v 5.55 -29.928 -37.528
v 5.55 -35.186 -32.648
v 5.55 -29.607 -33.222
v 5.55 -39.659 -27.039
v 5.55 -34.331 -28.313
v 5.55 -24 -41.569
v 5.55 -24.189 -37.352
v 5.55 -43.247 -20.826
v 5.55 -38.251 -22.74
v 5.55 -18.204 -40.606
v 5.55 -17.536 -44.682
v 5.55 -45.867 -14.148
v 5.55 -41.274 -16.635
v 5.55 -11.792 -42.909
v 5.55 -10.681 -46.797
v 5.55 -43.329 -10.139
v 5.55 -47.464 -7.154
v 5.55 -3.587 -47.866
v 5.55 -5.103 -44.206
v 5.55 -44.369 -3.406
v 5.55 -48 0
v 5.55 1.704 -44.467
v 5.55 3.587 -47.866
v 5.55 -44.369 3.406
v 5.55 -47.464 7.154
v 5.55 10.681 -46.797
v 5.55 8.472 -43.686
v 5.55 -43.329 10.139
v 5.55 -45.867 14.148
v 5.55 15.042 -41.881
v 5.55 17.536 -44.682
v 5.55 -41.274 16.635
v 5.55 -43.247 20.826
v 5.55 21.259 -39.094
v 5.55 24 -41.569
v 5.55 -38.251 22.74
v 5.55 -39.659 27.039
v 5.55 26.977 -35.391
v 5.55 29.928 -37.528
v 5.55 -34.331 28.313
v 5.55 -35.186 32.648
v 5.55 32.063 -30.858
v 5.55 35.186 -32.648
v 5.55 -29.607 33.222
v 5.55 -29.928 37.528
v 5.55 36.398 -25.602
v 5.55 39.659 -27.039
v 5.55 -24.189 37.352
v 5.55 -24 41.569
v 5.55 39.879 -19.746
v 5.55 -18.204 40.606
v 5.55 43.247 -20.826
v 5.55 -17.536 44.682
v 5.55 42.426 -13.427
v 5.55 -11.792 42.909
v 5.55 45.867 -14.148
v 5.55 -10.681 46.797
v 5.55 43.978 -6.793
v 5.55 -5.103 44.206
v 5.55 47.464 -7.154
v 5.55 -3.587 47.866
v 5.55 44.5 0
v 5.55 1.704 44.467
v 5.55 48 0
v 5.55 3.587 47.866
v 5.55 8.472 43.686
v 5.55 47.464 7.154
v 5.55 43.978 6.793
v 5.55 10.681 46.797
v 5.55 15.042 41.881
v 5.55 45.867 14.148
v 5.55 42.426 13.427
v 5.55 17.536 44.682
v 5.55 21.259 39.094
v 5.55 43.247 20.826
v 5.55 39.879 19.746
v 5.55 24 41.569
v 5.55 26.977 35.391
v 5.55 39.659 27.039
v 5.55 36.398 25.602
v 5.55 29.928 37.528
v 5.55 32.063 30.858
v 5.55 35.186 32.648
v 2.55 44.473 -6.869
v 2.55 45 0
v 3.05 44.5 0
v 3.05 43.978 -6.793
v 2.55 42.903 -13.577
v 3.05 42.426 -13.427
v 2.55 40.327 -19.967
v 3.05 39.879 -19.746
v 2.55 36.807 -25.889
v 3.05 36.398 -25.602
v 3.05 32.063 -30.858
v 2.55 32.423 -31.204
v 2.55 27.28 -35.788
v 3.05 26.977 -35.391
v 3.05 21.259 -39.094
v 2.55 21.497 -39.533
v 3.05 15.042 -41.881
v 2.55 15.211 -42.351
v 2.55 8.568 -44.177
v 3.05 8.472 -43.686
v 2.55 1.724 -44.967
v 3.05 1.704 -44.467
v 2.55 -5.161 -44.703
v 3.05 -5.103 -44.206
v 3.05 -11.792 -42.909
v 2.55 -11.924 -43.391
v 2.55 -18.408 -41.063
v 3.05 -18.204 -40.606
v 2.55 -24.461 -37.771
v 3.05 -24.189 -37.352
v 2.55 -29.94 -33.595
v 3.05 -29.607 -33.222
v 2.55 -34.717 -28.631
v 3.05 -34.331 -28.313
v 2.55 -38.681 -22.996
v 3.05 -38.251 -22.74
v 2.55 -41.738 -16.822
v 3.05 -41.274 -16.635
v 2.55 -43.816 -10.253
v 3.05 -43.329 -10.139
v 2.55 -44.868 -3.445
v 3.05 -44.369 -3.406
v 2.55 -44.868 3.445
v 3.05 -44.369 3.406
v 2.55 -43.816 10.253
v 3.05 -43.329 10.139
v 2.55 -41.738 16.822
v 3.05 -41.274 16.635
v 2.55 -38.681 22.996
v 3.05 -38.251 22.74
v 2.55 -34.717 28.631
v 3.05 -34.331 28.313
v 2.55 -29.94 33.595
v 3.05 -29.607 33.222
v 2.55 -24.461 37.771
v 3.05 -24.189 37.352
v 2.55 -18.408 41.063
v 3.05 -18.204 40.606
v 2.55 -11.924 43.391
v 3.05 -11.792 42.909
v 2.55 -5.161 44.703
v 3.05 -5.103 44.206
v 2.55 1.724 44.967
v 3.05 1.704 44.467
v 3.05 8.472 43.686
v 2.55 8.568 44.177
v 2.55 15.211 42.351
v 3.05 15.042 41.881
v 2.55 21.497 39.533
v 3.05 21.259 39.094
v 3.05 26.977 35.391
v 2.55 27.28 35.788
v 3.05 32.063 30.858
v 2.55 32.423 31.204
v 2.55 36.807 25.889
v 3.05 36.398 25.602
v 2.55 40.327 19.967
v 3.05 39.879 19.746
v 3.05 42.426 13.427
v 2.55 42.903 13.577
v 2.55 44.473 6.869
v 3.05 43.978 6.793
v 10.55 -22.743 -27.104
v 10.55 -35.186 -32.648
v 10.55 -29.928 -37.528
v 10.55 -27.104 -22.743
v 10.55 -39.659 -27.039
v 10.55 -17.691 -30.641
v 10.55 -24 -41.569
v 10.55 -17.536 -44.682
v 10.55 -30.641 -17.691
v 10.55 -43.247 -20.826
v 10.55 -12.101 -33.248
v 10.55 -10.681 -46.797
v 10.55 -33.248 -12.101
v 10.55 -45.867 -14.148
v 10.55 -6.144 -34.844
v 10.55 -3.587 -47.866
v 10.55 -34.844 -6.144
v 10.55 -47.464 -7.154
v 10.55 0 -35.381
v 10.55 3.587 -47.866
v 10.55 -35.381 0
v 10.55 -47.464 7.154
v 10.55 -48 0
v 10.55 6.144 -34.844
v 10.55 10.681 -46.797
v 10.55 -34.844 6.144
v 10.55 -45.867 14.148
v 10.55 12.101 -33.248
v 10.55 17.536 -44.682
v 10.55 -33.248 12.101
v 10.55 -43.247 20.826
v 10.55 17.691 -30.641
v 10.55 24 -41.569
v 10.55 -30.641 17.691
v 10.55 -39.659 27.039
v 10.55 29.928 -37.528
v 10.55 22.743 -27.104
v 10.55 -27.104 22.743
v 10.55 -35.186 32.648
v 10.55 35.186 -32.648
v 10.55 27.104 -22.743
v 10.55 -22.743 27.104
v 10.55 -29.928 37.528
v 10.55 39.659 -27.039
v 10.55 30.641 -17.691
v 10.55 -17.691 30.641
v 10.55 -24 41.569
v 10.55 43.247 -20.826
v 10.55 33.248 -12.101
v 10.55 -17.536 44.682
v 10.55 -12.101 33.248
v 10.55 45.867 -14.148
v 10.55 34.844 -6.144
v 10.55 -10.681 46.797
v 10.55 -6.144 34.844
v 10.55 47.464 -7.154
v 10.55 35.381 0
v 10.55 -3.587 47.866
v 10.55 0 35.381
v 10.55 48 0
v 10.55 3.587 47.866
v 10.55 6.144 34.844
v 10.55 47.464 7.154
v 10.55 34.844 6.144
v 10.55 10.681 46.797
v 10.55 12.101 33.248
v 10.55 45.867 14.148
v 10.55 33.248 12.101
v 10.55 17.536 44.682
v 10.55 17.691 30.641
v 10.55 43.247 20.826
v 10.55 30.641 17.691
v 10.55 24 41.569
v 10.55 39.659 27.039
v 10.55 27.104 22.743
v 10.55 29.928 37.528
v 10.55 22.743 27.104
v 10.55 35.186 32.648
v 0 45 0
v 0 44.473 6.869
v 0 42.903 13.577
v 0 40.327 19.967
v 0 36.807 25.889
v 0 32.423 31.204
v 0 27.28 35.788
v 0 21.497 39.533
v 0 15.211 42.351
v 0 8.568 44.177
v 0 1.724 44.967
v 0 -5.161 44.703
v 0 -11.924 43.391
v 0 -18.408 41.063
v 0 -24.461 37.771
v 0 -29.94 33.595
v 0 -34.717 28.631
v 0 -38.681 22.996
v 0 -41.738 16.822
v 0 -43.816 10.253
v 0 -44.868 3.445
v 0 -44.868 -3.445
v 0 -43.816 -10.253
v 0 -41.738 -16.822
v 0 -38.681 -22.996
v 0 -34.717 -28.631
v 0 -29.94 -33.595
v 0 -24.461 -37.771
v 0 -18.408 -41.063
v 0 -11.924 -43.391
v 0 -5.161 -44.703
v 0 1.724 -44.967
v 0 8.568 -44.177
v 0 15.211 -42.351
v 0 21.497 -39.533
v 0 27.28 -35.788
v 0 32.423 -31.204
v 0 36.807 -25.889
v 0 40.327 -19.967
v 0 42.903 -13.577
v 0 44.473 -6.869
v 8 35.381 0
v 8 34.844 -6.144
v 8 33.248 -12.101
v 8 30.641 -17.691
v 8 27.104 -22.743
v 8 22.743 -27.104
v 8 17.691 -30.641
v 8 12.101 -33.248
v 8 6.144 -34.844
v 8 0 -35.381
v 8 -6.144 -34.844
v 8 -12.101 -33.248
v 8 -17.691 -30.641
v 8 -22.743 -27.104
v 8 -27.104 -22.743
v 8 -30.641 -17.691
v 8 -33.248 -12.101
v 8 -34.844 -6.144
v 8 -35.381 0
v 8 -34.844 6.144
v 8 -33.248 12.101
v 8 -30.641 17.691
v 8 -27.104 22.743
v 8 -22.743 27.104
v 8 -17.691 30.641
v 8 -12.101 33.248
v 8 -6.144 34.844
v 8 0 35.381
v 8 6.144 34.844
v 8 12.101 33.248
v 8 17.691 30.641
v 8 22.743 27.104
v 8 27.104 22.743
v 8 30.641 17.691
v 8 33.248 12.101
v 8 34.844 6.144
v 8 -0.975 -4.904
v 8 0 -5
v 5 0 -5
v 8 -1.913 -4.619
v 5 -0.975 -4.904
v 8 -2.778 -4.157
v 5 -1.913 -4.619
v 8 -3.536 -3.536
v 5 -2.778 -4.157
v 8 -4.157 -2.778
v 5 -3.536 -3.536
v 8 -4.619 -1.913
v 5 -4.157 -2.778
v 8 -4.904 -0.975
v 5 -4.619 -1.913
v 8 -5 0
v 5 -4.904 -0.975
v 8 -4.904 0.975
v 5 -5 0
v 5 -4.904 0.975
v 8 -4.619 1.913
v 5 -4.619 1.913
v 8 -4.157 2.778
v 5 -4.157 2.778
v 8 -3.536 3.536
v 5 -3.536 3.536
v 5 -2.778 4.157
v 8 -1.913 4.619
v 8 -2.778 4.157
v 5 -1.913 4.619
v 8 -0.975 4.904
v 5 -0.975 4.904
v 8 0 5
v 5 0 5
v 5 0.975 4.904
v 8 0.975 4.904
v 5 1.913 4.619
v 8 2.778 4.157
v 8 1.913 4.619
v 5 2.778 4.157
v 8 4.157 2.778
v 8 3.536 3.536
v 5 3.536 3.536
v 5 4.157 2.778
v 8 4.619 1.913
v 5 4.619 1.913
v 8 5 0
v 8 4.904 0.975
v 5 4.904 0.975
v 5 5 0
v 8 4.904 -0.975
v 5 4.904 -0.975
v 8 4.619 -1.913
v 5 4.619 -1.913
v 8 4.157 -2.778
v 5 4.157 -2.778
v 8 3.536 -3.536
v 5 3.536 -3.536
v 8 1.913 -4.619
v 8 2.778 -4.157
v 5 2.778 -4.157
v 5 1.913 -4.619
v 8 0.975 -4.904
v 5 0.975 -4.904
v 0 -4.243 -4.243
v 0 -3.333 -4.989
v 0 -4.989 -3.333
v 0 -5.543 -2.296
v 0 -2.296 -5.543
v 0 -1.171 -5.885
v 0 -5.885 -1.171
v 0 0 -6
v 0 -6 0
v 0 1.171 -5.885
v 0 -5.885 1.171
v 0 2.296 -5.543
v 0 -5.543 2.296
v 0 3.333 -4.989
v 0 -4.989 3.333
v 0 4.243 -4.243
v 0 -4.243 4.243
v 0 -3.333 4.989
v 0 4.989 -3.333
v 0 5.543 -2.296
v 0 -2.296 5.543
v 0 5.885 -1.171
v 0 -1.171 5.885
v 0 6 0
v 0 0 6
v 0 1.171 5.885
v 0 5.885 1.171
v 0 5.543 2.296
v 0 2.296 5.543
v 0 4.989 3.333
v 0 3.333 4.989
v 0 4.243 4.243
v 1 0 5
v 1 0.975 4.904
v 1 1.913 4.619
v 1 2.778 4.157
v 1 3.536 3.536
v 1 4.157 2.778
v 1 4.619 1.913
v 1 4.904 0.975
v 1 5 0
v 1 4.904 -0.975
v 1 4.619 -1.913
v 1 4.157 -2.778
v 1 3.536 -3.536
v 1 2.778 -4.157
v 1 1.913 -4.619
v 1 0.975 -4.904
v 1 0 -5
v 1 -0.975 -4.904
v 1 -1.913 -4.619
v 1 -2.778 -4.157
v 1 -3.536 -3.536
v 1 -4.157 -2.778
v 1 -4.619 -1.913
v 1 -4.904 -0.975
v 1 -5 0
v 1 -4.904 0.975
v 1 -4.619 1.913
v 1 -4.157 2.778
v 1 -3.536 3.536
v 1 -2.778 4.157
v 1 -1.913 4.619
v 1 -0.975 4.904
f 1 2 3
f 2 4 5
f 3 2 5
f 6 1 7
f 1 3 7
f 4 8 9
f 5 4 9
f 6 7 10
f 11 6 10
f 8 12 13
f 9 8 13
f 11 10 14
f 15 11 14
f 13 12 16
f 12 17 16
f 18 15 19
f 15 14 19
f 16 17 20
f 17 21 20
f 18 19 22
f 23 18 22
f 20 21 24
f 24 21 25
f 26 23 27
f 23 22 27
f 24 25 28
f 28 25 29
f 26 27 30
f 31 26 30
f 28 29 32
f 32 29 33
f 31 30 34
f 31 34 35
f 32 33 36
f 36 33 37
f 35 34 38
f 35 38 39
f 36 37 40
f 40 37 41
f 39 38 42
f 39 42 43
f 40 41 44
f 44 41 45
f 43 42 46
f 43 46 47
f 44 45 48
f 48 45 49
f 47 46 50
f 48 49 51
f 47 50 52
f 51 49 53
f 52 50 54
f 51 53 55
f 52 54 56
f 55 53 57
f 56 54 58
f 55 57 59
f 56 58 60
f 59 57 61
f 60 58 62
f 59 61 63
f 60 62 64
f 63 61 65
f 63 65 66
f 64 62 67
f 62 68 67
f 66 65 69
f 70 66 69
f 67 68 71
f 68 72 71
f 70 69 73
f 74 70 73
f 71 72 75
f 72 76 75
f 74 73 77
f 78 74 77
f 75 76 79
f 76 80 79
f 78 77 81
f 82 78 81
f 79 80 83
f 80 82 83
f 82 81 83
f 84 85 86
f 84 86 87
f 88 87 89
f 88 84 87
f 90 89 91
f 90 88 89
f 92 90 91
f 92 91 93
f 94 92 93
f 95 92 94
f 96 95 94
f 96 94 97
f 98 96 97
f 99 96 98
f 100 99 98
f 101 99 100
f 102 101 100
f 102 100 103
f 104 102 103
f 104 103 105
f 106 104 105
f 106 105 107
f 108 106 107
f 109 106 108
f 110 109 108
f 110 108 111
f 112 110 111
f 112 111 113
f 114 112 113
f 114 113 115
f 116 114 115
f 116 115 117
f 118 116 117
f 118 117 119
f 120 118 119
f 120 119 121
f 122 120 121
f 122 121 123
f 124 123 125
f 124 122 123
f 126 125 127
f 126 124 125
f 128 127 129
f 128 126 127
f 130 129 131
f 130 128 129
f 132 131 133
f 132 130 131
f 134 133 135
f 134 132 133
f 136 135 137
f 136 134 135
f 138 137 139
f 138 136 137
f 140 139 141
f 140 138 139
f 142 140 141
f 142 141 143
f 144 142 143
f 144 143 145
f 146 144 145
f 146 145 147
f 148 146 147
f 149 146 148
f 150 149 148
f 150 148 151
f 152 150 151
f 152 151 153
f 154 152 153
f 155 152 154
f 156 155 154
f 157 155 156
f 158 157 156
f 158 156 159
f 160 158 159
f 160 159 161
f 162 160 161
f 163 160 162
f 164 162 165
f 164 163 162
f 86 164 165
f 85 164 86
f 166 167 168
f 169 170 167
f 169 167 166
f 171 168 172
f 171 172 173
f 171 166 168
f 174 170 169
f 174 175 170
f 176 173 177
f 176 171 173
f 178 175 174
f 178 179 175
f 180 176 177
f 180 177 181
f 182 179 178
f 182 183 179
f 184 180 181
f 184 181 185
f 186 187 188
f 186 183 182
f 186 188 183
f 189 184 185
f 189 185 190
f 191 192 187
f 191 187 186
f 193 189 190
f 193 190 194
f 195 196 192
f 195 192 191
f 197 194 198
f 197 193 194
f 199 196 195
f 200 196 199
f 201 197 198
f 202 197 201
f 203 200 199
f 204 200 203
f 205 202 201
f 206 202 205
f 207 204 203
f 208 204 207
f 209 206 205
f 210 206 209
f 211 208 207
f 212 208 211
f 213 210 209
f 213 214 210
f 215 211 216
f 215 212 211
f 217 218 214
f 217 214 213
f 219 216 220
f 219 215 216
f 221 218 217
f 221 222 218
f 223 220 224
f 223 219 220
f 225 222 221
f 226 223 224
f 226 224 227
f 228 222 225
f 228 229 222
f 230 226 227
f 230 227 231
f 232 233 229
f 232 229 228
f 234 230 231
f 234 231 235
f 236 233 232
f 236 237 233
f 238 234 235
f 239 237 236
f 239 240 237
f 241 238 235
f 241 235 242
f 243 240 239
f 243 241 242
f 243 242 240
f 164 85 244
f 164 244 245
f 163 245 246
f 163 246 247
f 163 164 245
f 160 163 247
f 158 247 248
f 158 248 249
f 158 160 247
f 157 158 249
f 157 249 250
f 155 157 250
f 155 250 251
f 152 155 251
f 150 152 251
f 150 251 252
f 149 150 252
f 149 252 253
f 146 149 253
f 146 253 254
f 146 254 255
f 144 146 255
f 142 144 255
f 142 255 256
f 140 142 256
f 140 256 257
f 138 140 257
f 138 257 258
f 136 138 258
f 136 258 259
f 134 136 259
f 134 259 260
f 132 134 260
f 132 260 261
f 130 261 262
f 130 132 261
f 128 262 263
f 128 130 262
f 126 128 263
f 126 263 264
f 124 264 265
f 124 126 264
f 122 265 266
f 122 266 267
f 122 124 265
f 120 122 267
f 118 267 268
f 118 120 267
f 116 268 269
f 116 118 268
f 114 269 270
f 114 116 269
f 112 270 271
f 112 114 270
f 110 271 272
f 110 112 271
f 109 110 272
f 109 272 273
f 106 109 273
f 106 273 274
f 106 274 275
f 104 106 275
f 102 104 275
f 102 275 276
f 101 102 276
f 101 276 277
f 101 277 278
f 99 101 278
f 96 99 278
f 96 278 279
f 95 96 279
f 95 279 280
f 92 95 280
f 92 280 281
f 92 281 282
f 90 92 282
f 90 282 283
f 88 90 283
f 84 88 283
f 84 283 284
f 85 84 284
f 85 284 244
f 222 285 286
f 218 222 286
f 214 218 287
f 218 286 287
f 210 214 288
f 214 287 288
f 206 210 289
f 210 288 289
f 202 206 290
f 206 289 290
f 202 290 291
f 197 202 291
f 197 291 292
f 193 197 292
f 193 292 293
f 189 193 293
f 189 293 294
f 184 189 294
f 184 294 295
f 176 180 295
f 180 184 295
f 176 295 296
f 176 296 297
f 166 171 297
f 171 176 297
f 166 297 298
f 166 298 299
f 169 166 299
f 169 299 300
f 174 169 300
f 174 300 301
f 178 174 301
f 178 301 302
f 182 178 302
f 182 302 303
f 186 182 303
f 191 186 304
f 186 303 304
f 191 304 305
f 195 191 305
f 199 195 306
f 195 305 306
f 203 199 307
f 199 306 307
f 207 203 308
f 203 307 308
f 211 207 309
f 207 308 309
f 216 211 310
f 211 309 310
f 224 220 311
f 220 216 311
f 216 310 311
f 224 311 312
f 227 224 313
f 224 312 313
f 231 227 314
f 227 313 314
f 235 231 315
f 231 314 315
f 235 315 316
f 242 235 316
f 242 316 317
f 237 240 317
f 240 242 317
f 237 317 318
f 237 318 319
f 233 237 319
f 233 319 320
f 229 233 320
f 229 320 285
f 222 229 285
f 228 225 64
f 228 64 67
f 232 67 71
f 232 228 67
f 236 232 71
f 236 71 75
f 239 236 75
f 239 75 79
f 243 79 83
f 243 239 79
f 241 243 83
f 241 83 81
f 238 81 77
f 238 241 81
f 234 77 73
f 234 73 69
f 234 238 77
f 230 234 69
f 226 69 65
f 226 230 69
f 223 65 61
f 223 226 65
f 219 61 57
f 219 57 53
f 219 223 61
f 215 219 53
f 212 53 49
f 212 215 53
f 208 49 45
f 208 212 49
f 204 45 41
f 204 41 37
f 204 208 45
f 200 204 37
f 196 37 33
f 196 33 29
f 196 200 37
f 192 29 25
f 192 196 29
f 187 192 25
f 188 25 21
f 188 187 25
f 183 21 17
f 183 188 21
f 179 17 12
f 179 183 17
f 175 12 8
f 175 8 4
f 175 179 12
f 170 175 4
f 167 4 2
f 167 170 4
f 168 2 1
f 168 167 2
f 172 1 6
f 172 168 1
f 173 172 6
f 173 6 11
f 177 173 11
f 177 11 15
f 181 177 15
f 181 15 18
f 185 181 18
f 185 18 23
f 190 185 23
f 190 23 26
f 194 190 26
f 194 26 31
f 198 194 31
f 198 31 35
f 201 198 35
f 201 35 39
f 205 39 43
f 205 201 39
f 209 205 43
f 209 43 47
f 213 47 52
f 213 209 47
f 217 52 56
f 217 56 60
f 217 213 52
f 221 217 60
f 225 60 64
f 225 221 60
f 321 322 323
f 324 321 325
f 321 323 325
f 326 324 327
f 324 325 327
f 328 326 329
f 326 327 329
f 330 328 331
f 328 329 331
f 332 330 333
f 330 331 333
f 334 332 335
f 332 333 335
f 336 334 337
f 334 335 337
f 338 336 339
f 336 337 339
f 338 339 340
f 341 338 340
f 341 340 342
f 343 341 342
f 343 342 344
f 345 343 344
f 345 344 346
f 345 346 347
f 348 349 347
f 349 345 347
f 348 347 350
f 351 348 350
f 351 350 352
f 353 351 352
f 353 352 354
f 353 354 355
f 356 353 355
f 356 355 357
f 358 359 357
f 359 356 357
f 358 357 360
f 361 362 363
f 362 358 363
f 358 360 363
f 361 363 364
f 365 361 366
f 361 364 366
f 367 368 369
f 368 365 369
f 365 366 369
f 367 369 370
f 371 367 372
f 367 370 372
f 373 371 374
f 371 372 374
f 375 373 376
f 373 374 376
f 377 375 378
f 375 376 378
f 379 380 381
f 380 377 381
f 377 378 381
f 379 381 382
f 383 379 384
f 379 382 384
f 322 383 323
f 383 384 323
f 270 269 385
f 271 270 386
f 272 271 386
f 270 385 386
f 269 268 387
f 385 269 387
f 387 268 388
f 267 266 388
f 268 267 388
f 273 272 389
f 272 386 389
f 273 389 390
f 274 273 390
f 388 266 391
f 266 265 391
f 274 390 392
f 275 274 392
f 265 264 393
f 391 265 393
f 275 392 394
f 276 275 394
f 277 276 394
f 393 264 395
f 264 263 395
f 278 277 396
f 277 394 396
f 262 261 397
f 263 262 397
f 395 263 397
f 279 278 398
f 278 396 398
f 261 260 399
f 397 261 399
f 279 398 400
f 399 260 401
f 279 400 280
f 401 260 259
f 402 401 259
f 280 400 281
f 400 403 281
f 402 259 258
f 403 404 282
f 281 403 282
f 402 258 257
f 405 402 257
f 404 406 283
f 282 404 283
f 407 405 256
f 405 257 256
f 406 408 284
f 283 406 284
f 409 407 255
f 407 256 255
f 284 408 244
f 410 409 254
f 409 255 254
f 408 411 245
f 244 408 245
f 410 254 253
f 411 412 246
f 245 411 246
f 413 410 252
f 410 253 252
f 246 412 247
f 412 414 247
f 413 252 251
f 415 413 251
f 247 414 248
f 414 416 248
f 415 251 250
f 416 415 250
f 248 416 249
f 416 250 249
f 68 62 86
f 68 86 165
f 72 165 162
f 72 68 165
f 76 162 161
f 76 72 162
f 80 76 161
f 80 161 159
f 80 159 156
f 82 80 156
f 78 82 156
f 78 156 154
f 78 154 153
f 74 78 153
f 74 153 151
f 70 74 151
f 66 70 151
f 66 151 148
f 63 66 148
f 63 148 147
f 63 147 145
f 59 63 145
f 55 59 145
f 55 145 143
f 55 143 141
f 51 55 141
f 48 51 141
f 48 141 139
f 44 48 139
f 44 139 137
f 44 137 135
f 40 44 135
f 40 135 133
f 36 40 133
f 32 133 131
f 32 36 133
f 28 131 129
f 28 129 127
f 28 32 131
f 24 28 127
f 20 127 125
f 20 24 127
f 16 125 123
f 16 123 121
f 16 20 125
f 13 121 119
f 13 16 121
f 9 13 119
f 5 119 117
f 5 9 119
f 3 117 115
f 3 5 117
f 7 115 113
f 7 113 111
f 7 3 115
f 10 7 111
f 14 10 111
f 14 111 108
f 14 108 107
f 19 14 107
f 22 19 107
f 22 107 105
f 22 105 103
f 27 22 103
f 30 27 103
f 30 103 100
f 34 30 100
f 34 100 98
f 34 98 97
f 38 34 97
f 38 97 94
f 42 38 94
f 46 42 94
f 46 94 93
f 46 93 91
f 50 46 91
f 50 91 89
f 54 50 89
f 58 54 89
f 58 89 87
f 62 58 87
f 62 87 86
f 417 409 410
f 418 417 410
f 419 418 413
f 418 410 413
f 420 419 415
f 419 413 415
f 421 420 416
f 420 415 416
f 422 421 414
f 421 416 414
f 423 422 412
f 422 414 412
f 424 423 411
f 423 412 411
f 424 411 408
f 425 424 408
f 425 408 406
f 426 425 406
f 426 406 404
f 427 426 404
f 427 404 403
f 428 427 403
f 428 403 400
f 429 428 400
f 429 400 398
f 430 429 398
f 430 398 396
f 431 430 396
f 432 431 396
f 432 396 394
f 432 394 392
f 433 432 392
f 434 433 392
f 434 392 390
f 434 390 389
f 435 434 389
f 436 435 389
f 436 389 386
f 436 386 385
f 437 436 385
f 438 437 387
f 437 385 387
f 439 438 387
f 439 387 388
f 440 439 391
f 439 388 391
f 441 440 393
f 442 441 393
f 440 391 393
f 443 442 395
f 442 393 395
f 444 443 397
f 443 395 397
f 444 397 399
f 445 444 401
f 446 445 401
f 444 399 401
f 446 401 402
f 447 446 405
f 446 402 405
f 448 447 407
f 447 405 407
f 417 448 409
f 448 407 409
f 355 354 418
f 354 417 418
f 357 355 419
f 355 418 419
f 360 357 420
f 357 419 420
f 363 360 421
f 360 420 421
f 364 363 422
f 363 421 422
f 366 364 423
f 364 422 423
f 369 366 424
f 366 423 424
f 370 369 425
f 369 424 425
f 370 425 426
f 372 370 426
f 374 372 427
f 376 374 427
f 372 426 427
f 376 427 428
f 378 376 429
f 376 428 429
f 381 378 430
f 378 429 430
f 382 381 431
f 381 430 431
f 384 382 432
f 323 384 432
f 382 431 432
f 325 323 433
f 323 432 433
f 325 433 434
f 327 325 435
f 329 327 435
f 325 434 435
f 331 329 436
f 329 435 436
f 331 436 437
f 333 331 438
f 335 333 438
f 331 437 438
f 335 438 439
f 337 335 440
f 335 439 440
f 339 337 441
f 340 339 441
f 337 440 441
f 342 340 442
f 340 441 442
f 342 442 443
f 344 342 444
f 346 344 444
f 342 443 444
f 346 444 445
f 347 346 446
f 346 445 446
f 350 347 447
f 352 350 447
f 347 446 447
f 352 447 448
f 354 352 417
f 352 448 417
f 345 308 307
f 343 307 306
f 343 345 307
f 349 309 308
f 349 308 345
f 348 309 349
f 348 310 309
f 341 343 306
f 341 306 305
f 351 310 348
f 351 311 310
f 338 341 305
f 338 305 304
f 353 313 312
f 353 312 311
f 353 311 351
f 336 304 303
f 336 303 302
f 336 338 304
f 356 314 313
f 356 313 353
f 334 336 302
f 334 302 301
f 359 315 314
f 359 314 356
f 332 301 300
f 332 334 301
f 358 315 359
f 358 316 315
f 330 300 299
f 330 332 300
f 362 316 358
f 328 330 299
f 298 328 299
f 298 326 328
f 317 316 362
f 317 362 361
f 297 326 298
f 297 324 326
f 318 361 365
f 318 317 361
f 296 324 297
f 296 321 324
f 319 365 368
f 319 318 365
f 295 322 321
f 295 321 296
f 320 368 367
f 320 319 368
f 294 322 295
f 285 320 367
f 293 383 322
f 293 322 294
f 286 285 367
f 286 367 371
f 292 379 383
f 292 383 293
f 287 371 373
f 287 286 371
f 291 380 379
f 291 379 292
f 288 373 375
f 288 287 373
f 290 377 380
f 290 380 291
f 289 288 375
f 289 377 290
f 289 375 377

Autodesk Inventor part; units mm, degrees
ref_plane "YZ Plane" through (0, 0, 0) normal (1, 0, 0) x (0, 1, 0)
ref_plane "XZ Plane" through (0, 0, 0) normal (0, 1, 0) x (-1, 0, 0)
ref_plane "XY Plane" through (0, 0, 0) normal (0, 0, 1) x (1, 0, 0)
sketch "Эскиз1" plane through (0, 0, 0) normal (0, 0, 1) x (1, 0, 0)
  line L0 (0, 0) -> (6.2046, 0)
  line L1 (0, 0) -> (0, 45)
  line L2 (0, 45) -> (2.55, 45)
  line L3 (2.55, 45) -> (3.05, 44.5)
  line L4 (3.05, 44.5) -> (5.55, 44.5)
  line L5 (5.55, 44.5) -> (5.55, 48)
  line L6 (5.55, 48) -> (10.55, 48)
  line L7 (10.55, 48) -> (10.55, 35.3814)
  line L8 (10.55, 35.3814) -> (5, 35.3814)
  line L9 (5, 35.3814) -> (5, 0)
  line L10 (0, 0) -> (5, 0)
  dimension "d0" = 45
  dimension "d1" = 0.5
  dimension "d2" = 90
  dimension "d3" = 10.55
  dimension "d4" = 5
  dimension "d6" = 3
  dimension "d7" = 2.5
  dimension "d8" = 5
revolve "Вращение1" add sketch "Эскиз1" angle 360 about axis through (0, 0, 0) along (1, 0, 0)
sketch "Эскиз2" plane through (0, 0, 0) normal (-1, 0, 0) x (0, 0, 1)
  circle A0 centre (0, 0) radius 5
  dimension "d10" = 10
extrude "Выдавливание1" cut sketch "Эскиз2" against normal through all
thread "Резьба1" size "M10x0.5" class "6H" standard "ANSI Metric M Profile" length 10
chamfer "Фаска1" distance 1 angle 45 1 edges at (0, 0, -5)
sketch "Эскиз3" plane through (5, 0, 0) normal (1, 0, 0) x (0, 0, -1)
  circle A0 centre (0, 0) radius 5 projected
  circle A1 centre (0, 0) radius 35.3814
extrude "Выдавливание2" add sketch "Эскиз3" along normal blind 3
properties part number "Крышка тих"
